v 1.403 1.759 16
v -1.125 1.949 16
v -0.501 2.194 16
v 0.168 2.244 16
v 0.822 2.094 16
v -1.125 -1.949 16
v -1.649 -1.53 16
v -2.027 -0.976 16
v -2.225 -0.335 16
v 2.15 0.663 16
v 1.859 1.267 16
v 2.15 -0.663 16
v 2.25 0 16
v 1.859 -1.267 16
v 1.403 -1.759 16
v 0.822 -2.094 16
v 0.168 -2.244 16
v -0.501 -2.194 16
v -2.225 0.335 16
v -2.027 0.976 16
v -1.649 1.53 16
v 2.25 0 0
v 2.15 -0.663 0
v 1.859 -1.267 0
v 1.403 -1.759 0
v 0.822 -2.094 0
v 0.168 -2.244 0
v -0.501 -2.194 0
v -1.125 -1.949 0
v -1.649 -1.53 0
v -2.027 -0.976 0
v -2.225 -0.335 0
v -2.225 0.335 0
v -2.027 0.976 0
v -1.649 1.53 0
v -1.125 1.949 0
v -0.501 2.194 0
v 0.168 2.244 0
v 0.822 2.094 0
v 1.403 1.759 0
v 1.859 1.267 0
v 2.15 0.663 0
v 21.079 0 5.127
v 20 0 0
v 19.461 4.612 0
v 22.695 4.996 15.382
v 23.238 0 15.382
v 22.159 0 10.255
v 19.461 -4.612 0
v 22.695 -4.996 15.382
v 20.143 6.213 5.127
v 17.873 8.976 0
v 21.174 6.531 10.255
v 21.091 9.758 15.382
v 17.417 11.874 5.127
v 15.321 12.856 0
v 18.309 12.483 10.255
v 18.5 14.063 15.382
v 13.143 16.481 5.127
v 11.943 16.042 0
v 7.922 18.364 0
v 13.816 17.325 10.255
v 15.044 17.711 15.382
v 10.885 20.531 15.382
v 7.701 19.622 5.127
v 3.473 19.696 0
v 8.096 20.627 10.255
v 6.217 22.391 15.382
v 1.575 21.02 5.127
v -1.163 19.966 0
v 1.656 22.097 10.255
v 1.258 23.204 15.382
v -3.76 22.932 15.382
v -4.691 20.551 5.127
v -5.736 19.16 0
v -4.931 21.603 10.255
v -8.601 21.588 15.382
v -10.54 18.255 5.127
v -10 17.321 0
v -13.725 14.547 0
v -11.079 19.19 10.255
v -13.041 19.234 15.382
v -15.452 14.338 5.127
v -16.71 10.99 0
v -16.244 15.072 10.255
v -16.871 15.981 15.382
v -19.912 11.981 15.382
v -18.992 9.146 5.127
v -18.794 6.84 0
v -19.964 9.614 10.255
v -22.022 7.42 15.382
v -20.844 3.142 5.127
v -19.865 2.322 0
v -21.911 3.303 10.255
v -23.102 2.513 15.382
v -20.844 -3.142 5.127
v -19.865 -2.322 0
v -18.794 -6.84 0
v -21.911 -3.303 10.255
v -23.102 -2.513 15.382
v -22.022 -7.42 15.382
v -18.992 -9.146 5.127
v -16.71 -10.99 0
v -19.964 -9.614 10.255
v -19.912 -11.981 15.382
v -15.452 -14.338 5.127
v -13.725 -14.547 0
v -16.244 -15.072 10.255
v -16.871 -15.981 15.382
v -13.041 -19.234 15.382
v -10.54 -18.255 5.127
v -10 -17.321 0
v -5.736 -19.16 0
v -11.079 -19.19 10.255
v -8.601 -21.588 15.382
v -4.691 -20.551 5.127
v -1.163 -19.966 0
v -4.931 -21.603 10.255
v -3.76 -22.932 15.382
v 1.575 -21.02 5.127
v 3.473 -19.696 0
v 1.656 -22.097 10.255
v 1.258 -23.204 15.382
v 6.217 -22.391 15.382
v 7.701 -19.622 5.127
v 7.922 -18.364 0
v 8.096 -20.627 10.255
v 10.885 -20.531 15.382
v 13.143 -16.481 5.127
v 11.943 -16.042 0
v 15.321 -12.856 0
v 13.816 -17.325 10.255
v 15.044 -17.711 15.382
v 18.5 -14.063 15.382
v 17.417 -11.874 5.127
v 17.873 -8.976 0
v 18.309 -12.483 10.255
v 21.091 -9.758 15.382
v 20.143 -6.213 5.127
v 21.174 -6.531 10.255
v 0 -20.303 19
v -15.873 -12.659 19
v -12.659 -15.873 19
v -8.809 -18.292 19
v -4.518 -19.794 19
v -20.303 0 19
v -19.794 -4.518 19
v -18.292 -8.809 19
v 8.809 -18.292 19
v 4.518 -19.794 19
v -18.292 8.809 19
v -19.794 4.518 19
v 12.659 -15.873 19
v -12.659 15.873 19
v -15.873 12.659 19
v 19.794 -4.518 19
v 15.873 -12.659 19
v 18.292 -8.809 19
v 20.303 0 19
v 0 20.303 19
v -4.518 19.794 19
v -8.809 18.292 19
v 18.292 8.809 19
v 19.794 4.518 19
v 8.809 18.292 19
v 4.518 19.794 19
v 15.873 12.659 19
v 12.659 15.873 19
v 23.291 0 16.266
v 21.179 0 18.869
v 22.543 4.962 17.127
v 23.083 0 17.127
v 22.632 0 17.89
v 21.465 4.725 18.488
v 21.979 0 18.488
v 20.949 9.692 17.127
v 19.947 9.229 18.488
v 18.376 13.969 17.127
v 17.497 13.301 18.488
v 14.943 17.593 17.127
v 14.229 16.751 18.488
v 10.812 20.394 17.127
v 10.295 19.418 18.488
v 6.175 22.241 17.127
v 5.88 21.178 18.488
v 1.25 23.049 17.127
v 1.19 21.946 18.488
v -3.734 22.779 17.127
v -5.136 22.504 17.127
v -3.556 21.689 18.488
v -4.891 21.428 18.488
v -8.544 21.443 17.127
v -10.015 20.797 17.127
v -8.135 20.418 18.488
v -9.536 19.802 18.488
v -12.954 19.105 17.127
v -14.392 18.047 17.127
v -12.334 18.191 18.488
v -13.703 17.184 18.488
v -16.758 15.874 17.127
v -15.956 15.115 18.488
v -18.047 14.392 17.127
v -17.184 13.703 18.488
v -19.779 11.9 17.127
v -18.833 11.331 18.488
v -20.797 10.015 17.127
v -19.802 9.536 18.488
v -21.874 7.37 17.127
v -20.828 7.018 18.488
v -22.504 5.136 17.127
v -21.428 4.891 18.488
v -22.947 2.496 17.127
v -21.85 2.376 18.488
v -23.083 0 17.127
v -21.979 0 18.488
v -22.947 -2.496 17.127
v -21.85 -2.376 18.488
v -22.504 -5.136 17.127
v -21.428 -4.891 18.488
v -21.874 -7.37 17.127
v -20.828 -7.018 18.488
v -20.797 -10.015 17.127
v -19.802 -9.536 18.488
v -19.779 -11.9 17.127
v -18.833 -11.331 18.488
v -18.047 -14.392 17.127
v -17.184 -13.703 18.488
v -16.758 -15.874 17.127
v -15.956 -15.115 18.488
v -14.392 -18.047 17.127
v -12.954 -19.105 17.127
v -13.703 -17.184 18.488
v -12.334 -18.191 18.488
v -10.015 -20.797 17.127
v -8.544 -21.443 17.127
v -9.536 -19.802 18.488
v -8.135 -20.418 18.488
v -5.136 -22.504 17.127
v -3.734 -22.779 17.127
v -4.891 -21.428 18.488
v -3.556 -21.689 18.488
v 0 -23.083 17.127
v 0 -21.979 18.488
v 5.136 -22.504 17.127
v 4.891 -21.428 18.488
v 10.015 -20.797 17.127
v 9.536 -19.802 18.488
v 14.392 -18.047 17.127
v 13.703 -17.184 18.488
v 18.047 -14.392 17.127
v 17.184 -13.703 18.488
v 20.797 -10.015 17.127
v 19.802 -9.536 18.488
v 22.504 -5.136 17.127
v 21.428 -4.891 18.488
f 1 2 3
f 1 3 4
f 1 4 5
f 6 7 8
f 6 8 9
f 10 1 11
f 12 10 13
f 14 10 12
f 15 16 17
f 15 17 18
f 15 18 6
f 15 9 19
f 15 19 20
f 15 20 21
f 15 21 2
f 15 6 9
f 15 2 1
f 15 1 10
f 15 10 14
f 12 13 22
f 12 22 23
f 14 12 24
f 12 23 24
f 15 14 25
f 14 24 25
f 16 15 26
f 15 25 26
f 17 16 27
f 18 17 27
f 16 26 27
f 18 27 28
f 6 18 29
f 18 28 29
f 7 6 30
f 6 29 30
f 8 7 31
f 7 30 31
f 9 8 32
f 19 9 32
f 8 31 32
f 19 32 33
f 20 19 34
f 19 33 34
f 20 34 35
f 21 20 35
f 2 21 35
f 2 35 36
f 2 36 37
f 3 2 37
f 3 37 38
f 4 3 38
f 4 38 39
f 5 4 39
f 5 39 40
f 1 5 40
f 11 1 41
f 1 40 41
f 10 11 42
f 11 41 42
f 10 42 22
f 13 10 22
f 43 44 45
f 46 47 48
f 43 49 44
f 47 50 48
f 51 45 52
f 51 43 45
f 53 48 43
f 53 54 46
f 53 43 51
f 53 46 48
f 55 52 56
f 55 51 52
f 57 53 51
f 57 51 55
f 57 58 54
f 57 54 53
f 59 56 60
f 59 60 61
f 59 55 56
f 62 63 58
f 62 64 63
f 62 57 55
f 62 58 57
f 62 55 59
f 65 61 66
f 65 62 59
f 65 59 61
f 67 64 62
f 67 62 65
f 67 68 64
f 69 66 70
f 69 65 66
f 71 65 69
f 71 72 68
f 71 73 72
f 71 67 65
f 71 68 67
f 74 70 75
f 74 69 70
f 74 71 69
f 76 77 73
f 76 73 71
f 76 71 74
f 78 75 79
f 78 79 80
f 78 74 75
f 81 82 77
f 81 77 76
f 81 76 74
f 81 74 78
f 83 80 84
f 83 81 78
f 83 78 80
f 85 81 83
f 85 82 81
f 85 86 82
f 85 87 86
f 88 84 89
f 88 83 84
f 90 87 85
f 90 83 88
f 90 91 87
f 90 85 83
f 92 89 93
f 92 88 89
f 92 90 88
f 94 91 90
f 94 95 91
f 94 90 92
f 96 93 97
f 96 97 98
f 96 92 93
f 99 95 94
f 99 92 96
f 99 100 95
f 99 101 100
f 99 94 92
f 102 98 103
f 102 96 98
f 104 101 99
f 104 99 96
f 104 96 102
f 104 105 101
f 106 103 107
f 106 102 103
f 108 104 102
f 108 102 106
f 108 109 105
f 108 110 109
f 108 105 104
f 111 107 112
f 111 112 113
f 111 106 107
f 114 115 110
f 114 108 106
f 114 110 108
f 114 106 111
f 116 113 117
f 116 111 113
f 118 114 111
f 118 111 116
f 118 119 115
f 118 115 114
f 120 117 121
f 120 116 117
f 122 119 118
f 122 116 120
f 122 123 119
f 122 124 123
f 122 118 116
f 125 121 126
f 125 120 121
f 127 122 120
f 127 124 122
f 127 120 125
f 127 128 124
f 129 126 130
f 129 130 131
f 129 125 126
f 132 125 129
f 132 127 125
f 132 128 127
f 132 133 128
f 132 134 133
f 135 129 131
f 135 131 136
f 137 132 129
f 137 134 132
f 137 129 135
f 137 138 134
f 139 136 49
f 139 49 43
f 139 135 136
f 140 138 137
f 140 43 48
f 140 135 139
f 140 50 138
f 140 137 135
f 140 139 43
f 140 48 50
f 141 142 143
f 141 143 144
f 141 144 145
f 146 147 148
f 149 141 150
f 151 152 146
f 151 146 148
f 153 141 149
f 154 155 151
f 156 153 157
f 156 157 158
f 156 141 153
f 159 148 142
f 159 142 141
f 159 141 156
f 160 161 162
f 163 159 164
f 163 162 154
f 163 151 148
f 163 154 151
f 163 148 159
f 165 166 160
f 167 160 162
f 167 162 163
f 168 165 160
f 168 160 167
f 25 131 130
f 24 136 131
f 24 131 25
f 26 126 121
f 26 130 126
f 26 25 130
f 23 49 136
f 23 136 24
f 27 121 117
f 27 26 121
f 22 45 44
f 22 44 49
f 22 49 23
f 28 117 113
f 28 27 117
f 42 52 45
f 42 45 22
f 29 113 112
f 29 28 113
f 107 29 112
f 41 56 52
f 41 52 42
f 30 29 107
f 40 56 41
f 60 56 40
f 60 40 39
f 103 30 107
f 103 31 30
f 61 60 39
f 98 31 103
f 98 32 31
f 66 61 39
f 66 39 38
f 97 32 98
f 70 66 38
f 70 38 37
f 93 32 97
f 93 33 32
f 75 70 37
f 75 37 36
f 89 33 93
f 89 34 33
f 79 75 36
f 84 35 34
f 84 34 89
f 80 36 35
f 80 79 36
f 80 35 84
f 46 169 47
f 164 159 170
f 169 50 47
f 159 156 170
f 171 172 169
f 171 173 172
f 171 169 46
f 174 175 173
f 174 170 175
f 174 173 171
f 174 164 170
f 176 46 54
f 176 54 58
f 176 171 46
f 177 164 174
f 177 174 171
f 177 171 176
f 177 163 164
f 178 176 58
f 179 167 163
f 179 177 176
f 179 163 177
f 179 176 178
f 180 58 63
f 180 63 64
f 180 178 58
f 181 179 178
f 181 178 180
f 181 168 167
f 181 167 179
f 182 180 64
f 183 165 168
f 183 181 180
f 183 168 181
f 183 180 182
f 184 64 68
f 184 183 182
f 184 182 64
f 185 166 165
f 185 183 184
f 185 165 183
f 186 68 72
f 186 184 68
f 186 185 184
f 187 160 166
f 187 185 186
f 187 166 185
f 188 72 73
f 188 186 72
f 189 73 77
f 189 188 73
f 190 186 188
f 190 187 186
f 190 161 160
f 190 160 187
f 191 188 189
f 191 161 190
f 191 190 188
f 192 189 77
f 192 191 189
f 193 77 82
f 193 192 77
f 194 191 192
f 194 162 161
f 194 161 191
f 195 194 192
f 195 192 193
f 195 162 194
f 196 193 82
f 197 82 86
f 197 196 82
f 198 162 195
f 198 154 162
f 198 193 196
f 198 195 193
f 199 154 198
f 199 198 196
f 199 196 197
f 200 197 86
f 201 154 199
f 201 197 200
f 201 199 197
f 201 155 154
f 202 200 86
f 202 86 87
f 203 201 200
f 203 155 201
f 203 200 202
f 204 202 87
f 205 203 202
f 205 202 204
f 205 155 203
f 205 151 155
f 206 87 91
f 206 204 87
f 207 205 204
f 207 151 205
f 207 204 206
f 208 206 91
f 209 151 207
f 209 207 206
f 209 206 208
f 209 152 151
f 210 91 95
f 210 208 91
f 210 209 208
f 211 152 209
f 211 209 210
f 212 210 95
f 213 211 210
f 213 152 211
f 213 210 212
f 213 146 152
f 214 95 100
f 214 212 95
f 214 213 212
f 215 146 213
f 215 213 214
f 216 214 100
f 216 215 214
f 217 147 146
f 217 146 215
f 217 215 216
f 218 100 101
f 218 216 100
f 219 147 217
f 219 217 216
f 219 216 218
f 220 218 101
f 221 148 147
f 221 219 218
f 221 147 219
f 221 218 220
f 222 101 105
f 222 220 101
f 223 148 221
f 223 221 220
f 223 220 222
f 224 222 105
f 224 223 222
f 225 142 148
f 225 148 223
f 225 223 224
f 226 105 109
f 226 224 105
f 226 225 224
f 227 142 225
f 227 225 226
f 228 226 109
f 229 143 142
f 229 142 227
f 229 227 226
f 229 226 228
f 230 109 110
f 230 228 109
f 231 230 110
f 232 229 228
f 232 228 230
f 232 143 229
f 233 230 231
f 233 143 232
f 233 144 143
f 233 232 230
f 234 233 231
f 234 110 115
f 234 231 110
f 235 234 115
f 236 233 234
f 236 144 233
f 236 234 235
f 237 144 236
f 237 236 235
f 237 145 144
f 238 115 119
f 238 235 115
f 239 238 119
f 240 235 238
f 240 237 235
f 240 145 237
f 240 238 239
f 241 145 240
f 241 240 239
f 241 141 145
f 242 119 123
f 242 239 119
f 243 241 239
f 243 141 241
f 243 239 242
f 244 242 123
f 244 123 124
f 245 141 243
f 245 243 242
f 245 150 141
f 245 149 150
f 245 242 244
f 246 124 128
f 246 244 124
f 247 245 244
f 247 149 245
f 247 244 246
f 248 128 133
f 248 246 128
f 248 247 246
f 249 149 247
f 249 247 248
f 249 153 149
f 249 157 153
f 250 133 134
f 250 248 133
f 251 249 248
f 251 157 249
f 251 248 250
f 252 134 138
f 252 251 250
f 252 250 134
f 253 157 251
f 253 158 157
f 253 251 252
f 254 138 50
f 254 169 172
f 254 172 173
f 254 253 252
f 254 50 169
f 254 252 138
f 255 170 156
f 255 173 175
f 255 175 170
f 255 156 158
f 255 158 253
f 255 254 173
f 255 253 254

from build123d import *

# Parameters (mm, degrees)
F2_R     = 3
F3_R     = 2.25
F4_DEPTH = 16


with BuildPart() as f1:
    # F0 (on Front) → F1 (revolve)
    with BuildSketch(Plane.XZ):
        Polygon((0, 19), (0, 0), (20, 0), (24, 19), align=None)
    revolve(axis=Axis((0, 0, 9.5), (0, 0, 1)))

    # F2
    f2_edges = [f1.edges().sort_by_distance(p)[0] for p in [
        (-24, 0, 19),
    ]]
    fillet(f2_edges, radius=F2_R)

    # F3 (on face) → F4 (cut)
    with BuildSketch(Plane(origin=(0, 0, 0), x_dir=(1, 0, 0), z_dir=(0, 0, -1))):
        Circle(F3_R)
    extrude(amount=-F4_DEPTH, mode=Mode.SUBTRACT)


solid = f1.part
